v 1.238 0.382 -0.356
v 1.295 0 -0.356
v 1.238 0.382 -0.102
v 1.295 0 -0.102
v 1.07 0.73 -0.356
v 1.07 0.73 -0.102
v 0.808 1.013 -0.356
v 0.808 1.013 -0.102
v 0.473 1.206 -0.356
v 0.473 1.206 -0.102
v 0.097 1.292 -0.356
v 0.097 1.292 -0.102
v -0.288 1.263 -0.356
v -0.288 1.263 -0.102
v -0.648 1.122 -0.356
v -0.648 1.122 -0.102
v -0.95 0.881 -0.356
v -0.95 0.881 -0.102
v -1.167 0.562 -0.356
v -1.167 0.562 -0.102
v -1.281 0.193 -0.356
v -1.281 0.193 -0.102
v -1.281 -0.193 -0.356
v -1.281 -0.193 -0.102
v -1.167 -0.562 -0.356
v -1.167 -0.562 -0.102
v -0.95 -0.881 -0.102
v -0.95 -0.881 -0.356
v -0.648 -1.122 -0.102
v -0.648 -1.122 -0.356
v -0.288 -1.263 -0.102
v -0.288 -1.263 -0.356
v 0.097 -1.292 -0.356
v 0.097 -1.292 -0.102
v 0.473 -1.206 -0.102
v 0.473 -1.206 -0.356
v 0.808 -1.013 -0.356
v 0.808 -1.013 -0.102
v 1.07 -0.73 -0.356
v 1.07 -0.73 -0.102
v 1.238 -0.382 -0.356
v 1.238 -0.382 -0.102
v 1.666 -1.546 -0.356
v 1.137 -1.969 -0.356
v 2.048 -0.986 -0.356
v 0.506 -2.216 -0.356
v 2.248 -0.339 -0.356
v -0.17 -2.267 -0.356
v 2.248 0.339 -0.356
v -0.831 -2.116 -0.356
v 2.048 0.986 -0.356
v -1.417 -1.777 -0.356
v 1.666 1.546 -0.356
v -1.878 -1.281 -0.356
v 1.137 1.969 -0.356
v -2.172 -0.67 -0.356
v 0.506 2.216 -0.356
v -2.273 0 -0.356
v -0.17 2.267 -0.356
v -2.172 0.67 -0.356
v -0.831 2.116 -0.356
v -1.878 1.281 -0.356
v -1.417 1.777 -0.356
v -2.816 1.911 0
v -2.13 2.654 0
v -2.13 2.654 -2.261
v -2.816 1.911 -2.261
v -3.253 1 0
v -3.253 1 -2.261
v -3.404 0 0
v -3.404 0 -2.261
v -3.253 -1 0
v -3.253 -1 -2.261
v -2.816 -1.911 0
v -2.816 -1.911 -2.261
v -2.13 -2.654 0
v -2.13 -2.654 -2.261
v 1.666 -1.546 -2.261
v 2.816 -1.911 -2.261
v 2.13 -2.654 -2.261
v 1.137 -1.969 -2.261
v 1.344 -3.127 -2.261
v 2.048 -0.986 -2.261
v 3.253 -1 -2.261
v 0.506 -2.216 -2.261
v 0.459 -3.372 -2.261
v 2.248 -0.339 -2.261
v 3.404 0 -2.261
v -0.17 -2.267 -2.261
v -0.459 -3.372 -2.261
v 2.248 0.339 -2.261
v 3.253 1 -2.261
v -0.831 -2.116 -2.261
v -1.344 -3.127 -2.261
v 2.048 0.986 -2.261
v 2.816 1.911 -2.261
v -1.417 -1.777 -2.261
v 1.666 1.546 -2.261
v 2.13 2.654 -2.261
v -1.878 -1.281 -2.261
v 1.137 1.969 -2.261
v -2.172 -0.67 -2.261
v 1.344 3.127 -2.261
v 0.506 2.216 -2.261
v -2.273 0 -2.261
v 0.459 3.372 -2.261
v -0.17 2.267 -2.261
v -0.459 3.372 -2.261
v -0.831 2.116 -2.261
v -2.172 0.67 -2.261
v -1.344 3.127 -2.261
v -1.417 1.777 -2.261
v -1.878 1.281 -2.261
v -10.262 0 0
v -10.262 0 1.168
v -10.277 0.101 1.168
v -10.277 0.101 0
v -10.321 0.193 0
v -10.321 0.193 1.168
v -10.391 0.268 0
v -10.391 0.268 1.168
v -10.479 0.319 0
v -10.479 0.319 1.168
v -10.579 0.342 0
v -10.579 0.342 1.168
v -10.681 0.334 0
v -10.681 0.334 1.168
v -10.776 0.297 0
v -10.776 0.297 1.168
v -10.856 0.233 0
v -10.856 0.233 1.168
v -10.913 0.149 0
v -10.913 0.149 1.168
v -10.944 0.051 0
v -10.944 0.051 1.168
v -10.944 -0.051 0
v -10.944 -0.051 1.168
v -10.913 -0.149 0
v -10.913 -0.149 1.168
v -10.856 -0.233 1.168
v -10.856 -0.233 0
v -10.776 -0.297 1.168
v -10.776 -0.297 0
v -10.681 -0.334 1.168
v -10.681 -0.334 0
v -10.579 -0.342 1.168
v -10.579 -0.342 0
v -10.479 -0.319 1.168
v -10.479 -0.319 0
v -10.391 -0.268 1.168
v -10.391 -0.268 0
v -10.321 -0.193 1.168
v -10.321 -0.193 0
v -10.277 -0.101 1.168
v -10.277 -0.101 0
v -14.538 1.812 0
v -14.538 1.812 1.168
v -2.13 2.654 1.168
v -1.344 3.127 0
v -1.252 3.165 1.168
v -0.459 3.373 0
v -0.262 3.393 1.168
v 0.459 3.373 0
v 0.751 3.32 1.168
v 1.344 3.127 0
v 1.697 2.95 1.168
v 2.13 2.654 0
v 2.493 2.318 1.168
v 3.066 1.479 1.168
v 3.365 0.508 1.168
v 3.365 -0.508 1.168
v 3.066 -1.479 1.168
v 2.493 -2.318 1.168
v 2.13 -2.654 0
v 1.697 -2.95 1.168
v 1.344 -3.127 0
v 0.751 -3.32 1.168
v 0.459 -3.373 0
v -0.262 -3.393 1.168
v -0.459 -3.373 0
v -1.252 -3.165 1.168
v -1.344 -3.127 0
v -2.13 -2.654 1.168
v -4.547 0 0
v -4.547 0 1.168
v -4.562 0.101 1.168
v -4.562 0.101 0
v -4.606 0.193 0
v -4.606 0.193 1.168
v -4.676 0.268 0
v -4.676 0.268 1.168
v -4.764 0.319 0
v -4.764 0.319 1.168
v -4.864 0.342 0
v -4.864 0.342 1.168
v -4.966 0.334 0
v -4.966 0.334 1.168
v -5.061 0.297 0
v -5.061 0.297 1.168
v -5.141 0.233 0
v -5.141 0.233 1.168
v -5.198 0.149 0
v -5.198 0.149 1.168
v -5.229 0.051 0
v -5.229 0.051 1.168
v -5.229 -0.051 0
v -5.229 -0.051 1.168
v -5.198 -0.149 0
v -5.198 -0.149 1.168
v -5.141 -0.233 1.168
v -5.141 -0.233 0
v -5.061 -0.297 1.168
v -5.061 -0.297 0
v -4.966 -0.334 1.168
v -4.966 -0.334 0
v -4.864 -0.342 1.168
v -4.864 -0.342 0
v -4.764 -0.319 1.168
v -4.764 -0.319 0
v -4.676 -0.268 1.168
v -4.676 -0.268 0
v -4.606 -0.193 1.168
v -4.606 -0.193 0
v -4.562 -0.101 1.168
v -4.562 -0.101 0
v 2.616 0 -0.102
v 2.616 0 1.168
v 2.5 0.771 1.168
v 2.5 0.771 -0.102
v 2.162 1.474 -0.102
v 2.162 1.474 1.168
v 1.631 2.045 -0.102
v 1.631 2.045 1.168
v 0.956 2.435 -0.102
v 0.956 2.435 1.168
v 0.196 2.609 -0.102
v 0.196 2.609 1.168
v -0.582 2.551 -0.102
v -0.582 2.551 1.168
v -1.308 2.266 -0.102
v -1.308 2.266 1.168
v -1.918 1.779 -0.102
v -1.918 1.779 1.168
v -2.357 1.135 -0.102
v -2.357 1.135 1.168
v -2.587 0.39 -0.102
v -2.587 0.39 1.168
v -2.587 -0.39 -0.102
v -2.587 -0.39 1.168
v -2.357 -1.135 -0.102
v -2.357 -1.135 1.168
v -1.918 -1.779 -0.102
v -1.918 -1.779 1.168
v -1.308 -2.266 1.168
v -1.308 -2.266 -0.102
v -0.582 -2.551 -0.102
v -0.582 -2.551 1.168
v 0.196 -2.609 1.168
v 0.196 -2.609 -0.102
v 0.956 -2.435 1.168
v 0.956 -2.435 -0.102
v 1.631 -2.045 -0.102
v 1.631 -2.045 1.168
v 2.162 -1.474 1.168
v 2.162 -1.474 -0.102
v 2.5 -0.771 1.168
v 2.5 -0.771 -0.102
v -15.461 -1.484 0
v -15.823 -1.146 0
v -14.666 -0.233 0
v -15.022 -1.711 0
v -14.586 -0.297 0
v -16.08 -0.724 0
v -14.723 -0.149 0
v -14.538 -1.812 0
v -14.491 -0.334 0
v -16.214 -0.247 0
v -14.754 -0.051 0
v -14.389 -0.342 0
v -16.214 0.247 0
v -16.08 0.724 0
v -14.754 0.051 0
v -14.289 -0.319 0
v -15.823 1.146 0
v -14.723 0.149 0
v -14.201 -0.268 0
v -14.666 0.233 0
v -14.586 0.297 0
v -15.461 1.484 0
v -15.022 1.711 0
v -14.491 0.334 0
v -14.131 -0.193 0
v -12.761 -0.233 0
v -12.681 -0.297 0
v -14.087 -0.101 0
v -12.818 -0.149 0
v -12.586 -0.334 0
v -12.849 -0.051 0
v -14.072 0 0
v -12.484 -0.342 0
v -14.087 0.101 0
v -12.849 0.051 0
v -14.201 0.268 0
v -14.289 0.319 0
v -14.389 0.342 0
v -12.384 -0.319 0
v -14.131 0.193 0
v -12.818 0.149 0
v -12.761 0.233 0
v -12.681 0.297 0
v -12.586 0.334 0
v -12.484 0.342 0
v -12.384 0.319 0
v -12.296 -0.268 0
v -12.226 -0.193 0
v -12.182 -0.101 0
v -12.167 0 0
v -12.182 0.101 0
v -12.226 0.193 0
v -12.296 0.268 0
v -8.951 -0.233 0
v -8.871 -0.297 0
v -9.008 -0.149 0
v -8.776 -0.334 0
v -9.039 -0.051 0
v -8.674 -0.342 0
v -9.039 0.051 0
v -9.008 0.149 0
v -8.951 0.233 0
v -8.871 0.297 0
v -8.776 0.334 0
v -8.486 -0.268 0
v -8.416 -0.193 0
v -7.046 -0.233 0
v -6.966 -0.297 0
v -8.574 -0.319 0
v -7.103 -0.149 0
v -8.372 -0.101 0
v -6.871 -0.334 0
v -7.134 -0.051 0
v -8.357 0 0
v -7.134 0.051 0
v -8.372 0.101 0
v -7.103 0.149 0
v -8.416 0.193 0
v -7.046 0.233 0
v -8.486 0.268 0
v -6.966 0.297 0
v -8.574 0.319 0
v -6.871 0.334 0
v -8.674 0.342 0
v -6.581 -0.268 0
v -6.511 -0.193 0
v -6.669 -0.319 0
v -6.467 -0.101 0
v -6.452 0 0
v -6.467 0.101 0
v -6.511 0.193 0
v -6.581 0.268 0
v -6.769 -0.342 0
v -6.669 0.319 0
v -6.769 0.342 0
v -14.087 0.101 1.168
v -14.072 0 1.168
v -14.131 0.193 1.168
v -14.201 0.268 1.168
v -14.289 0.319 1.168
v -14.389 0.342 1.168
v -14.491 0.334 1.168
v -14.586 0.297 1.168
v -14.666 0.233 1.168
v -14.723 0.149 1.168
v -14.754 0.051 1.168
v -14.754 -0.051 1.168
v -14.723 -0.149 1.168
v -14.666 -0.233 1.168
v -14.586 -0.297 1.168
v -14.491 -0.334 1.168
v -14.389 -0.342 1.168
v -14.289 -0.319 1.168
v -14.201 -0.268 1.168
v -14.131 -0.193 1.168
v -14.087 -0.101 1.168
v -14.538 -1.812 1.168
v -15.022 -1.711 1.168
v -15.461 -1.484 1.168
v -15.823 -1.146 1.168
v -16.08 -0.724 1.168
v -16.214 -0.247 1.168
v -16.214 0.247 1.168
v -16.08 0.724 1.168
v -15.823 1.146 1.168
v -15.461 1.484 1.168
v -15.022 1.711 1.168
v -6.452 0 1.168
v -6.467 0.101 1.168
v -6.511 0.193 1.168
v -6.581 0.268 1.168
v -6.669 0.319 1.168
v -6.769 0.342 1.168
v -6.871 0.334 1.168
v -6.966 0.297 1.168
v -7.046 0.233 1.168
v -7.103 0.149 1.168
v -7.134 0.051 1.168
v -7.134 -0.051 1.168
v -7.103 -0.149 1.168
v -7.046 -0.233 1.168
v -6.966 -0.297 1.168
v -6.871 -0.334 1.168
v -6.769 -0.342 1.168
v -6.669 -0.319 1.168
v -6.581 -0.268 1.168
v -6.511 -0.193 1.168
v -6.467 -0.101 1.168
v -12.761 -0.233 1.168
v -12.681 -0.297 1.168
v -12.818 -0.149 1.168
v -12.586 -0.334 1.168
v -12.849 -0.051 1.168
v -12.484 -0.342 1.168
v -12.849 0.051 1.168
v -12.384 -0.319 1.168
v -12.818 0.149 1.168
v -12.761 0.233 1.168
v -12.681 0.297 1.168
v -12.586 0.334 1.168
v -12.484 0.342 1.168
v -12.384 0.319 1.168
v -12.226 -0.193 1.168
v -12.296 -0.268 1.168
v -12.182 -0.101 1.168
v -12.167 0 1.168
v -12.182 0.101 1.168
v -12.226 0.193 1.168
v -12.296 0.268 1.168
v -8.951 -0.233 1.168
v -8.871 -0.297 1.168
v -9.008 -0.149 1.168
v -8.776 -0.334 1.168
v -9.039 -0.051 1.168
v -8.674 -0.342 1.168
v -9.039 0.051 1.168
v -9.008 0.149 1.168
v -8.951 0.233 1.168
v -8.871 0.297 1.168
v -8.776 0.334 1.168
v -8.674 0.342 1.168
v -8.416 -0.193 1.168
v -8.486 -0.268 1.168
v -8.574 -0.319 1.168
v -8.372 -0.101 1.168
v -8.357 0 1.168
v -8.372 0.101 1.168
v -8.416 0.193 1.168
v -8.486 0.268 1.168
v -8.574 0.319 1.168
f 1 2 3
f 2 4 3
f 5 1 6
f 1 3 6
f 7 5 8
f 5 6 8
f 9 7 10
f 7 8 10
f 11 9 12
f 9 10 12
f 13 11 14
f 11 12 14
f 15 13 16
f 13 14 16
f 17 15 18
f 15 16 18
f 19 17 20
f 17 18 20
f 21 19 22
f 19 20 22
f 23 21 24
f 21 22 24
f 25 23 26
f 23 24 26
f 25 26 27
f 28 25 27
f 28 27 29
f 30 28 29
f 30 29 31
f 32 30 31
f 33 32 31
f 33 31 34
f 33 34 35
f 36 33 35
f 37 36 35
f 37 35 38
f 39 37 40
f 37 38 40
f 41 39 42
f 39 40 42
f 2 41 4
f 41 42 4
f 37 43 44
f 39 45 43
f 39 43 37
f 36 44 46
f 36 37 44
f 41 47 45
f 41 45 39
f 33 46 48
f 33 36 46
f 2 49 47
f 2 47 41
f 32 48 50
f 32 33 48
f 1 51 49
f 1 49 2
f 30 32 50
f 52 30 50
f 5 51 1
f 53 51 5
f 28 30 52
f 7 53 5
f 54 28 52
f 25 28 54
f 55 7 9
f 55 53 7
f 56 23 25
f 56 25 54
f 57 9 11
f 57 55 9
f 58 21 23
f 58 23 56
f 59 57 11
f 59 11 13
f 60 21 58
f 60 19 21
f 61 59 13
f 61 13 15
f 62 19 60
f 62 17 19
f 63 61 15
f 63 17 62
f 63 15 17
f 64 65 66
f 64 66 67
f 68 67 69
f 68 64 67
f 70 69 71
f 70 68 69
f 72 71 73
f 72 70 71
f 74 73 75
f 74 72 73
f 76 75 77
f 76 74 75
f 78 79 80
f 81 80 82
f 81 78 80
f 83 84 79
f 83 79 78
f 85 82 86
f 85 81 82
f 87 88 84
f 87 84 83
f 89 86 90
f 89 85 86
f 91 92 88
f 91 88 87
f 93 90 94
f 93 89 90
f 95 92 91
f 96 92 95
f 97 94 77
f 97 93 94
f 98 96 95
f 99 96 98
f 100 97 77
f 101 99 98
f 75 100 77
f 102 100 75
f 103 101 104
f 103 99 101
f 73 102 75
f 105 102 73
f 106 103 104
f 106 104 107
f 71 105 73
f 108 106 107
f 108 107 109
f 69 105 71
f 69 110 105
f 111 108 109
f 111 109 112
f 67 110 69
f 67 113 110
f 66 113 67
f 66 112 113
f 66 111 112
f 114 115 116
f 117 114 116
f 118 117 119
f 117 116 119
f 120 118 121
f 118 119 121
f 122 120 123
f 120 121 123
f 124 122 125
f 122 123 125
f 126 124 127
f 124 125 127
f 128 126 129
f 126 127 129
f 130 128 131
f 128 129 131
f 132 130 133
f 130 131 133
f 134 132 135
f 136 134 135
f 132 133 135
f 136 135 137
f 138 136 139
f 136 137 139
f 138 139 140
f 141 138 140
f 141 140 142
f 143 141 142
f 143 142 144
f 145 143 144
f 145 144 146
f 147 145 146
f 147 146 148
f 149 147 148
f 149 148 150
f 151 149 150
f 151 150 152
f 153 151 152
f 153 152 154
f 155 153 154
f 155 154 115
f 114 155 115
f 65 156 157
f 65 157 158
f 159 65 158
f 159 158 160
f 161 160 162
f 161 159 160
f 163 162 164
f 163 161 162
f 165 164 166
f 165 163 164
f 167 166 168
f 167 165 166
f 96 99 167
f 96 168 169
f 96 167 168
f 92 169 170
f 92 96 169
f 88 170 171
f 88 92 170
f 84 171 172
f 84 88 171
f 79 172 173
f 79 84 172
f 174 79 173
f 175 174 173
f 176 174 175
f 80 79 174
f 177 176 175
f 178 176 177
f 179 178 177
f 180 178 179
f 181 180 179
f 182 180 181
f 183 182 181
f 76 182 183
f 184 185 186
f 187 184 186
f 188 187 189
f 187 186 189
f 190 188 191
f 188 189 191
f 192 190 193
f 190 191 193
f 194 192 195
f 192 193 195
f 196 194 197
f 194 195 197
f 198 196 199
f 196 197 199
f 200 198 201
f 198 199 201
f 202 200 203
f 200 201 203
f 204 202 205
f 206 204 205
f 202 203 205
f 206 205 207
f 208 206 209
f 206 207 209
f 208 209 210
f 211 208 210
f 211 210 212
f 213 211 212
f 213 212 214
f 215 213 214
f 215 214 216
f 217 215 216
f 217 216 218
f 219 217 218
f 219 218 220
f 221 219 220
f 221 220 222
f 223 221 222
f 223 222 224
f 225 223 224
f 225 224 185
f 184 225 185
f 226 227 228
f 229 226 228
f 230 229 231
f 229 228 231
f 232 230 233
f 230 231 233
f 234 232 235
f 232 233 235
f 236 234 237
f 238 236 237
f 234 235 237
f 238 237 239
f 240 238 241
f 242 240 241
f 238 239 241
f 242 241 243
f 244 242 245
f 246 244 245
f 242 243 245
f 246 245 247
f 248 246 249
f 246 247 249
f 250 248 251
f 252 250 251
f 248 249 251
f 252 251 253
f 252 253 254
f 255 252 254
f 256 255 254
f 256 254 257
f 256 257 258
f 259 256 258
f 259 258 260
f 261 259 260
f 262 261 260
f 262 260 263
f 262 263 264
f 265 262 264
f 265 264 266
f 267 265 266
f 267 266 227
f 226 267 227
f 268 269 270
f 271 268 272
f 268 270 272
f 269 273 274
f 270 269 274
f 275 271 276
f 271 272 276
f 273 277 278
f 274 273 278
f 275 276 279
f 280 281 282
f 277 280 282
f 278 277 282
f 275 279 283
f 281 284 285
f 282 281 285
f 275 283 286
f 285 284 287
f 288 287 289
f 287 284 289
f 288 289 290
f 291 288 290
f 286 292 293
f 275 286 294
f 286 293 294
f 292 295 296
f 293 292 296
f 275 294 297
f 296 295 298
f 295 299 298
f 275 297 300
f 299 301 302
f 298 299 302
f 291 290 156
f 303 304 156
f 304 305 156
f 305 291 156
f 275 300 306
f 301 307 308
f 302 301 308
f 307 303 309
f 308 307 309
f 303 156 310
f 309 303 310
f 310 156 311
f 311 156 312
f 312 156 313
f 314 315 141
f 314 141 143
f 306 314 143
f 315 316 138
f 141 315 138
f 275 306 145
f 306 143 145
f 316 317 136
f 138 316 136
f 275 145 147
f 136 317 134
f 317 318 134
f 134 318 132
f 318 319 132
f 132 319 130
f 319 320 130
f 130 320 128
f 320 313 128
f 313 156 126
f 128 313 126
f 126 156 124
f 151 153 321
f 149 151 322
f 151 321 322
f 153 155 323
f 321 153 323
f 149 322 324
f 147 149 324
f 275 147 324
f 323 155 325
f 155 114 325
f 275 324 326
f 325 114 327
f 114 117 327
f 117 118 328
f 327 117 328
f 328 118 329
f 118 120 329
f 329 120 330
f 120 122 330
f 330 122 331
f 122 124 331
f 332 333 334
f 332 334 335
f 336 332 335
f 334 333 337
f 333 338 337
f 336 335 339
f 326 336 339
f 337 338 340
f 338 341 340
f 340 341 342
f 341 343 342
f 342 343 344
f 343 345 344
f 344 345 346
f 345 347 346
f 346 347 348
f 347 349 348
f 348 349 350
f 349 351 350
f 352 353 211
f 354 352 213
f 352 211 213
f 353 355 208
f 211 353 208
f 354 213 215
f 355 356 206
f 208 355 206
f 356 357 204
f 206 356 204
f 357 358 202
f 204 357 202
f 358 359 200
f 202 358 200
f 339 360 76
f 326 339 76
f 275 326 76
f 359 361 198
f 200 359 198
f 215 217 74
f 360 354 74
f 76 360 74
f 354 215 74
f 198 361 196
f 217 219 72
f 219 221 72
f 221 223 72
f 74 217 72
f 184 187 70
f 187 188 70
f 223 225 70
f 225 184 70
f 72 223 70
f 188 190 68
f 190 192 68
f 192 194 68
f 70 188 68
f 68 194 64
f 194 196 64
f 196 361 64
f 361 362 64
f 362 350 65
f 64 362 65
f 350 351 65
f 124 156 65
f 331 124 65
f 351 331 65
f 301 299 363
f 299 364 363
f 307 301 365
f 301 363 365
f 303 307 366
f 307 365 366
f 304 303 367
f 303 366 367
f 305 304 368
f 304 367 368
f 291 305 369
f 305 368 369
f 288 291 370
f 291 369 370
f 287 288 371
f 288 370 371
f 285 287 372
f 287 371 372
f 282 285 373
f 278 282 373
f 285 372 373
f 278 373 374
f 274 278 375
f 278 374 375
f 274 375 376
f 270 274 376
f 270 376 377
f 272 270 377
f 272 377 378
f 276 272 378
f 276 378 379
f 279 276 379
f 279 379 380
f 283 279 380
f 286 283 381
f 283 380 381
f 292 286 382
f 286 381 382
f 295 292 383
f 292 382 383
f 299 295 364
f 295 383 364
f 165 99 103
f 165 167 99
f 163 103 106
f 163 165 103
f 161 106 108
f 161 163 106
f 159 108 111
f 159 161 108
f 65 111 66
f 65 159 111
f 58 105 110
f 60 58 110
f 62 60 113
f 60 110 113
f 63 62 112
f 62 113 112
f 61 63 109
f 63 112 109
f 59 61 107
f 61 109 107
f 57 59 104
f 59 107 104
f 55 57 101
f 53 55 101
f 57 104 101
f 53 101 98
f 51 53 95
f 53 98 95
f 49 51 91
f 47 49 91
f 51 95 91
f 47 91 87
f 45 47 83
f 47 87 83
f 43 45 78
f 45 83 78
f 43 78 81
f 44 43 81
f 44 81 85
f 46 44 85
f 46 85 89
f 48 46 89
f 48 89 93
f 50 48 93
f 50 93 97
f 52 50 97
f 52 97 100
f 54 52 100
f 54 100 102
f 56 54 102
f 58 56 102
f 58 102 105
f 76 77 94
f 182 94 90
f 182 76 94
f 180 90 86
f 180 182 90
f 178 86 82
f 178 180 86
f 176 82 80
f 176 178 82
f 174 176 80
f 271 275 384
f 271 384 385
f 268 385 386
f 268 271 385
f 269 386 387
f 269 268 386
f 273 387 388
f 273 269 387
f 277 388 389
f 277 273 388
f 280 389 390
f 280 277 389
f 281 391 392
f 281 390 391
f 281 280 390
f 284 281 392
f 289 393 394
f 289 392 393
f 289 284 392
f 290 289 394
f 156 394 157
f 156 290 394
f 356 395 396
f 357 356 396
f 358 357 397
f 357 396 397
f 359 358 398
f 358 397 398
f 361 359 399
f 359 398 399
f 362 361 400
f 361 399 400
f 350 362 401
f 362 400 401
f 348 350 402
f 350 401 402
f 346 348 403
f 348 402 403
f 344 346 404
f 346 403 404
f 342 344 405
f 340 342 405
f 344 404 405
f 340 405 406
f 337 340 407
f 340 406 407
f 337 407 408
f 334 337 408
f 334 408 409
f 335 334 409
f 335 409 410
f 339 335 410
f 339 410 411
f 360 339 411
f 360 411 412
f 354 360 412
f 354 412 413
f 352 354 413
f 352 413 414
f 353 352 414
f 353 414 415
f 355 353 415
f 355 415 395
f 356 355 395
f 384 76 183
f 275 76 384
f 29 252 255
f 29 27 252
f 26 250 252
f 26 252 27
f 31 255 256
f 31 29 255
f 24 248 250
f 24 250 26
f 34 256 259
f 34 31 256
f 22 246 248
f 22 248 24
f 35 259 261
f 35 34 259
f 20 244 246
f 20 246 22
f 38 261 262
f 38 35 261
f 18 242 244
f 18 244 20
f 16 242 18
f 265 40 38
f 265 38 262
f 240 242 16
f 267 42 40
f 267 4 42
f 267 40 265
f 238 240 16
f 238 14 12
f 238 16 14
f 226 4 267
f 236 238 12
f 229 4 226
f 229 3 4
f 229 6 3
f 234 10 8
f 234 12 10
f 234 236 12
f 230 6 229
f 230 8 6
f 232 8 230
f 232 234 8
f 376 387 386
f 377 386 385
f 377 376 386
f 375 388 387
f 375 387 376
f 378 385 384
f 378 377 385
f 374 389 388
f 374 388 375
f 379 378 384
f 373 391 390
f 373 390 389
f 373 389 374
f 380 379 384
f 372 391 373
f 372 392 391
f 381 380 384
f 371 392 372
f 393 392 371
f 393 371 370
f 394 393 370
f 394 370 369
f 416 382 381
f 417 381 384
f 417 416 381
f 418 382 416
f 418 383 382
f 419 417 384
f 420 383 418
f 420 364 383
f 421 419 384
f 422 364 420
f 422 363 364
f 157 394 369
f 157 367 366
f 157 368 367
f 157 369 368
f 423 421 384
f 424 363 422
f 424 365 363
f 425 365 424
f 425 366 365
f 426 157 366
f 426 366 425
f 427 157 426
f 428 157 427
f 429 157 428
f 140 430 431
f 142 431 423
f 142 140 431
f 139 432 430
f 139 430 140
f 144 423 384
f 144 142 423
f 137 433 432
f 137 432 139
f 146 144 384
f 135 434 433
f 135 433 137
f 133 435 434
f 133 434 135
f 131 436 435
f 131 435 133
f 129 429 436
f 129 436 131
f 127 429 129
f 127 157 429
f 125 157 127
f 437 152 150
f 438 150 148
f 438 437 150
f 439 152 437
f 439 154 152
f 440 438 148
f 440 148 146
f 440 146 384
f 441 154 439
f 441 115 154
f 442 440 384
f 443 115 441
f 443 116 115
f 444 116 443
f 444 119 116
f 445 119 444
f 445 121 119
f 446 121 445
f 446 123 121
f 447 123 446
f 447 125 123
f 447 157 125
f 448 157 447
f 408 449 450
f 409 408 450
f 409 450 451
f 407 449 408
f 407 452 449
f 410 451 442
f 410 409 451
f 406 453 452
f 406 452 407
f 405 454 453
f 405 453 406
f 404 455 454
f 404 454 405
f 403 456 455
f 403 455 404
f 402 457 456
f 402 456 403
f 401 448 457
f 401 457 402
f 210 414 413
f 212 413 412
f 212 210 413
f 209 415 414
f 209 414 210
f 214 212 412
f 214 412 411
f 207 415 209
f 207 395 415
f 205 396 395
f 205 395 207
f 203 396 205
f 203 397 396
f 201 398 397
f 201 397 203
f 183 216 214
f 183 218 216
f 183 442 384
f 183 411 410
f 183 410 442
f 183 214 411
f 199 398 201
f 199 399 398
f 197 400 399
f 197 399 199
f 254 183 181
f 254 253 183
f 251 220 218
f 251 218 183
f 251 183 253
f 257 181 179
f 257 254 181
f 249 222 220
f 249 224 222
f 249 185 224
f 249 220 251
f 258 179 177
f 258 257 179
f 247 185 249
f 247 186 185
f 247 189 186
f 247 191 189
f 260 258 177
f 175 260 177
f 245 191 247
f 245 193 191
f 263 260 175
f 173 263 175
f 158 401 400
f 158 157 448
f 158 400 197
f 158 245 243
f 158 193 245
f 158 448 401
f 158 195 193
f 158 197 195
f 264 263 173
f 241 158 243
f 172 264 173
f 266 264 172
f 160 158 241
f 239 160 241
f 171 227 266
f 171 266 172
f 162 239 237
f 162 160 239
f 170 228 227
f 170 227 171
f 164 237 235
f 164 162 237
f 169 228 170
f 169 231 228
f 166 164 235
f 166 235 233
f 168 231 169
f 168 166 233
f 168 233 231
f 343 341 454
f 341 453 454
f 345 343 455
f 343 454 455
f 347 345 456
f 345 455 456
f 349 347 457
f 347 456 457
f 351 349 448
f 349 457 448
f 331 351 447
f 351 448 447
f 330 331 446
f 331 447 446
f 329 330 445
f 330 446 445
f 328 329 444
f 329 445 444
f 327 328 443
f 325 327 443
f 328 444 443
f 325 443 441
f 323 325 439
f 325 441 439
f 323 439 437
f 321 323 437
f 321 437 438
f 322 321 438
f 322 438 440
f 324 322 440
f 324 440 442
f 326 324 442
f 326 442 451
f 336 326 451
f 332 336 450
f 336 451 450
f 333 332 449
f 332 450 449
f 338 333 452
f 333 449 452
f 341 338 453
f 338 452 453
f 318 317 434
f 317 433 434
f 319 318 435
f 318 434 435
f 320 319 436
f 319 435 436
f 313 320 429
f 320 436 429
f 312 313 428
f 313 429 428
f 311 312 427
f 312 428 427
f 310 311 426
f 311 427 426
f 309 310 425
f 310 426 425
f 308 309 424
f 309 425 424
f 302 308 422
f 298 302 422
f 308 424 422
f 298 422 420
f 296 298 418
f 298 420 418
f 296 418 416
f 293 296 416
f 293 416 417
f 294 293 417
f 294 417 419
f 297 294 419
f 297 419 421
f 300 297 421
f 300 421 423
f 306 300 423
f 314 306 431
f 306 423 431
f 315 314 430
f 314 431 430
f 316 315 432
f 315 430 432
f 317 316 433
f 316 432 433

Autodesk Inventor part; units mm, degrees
ref_plane "YZ Plane" through (0, 0, 0) normal (1, 0, 0) x (0, 1, 0)
ref_plane "XZ Plane" through (0, 0, 0) normal (0, 1, 0) x (-1, 0, 0)
ref_plane "XY Plane" through (0, 0, 0) normal (0, 0, 1) x (1, 0, 0)
sketch "Sketch1" plane through (0, 0, 0) normal (0, 0, 1) x (1, 0, 0)
  circle A0 centre (0, 0) radius 3.4036
  circle A1 centre (-14.4145, 0) radius 1.8161
  circle A2 centre (14.4145, 0) radius 1.8161
  line L0 (0, 0) -> (0, 12.9246) construction
  line L1 (-14.5375, 1.8119) -> (-2.1305, 2.6543)
  line L2 (2.1305, 2.6543) -> (14.5375, 1.8119)
  line L3 (14.5375, -1.8119) -> (2.1305, -2.6543)
  line L4 (-2.1305, -2.6543) -> (-14.5375, -1.8119)
  dimension "d0" = 6.8072
  dimension "d1" = 3.6322
  dimension "d2" = 32.4612
  dimension "d3" = 5.3086
extrude "Extrusion1" add sketch "Sketch1" along normal blind 1.1684
sketch "Sketch2" plane through (0, 0, 0) normal (0, 0, -1) x (-1, 0, 0)
  arc A0 (14.5375, -1.8119) -> (14.5375, 1.8119) centre (14.4145, 0) ccw projected
  line L0 (2.1305, 2.6543) -> (14.5375, 1.8119) projected
  arc A1 (2.1305, 2.6543) -> (-2.1305, 2.6543) centre (0, 0) ccw projected
  line L1 (-14.5375, 1.8119) -> (-2.1305, 2.6543) projected
  arc A2 (-14.5375, 1.8119) -> (-14.5375, -1.8119) centre (-14.4145, 0) ccw projected
  line L2 (-2.1305, -2.6543) -> (-14.5375, -1.8119) projected
  arc A3 (-2.1305, -2.6543) -> (2.1305, -2.6543) centre (0, 0) ccw projected
  line L3 (14.5375, -1.8119) -> (2.1305, -2.6543) projected
  circle A4 centre (0, 0) radius 3.4036
extrude "Extrusion2" add sketch "Sketch2" along normal blind 2.2606 contours A3 A4 A1
sketch "Sketch3" plane through (0, 0, -2.2606) normal (0, 0, -1) x (-1, 0, 0)
  circle A0 centre (0, 0) radius 2.2733
  dimension "d8" = 4.5466
extrude "Extrusion3" cut sketch "Sketch3" against normal blind 1.905
sketch "Sketch4" plane through (0, 0, 1.1684) normal (0, 0, 1) x (1, 0, 0)
  circle A0 centre (0, 0) radius 2.6162
  dimension "d11" = 5.2324
extrude "Extrusion4" cut sketch "Sketch4" against normal blind 1.27
sketch "Sketch5" plane through (0, 0, -0.1016) normal (0, 0, 1) x (1, 0, 0)
  circle A0 centre (0, 0) radius 1.2954
  dimension "d14" = 2.5908
extrude "Extrusion5" cut sketch "Sketch5" against normal blind 1.27
sketch "Sketch6" plane through (0, 0, 1.1684) normal (0, 0, 1) x (1, 0, 0)
  arc A0 (-14.5375, 1.8119) -> (-14.5375, -1.8119) centre (-14.4145, 0) ccw projected
  circle A1 centre (-14.4145, 0) radius 0.3429
  point P0 (0, 0)
  dimension "d17" = 0.6858
extrude "Extrusion6" cut sketch "Sketch6" against normal through all
pattern_linear "Rectangular Pattern1" count 6 spacing 1.905 along (1, 0, 0) of "Extrusion6"
mirror "Mirror1" about plane through (0, 0, 0) normal (1, 0, 0) of "Extrusion6", "Rectangular Pattern1"
sketch "Sketch7" plane through (0, 0, 1.1684) normal (0, 0, 1) x (1, 0, 0)
  arc A0 (2.1305, 2.6543) -> (-2.1305, 2.6543) centre (0, 0) ccw projected
  arc A1 (-2.1305, -2.6543) -> (2.1305, -2.6543) centre (0, 0) ccw projected
  circle A2 centre (0, 0) radius 3.4036
  circle A3 centre (0, 0) radius 3.4036 projected
  line L0 (1.1266, 3.2117) -> (19.4496, 9.8398)
  line L1 (19.4496, 9.8398) -> (21.7312, -12.9756)
  line L2 (21.7312, -12.9756) -> (1.4617, -3.0737)
extrude "Extrusion7" cut sketch "Sketch7" against normal through all contours A0 L0 L1 L2 A1 A2
properties part number "1 Way MicroServo Attachment"
